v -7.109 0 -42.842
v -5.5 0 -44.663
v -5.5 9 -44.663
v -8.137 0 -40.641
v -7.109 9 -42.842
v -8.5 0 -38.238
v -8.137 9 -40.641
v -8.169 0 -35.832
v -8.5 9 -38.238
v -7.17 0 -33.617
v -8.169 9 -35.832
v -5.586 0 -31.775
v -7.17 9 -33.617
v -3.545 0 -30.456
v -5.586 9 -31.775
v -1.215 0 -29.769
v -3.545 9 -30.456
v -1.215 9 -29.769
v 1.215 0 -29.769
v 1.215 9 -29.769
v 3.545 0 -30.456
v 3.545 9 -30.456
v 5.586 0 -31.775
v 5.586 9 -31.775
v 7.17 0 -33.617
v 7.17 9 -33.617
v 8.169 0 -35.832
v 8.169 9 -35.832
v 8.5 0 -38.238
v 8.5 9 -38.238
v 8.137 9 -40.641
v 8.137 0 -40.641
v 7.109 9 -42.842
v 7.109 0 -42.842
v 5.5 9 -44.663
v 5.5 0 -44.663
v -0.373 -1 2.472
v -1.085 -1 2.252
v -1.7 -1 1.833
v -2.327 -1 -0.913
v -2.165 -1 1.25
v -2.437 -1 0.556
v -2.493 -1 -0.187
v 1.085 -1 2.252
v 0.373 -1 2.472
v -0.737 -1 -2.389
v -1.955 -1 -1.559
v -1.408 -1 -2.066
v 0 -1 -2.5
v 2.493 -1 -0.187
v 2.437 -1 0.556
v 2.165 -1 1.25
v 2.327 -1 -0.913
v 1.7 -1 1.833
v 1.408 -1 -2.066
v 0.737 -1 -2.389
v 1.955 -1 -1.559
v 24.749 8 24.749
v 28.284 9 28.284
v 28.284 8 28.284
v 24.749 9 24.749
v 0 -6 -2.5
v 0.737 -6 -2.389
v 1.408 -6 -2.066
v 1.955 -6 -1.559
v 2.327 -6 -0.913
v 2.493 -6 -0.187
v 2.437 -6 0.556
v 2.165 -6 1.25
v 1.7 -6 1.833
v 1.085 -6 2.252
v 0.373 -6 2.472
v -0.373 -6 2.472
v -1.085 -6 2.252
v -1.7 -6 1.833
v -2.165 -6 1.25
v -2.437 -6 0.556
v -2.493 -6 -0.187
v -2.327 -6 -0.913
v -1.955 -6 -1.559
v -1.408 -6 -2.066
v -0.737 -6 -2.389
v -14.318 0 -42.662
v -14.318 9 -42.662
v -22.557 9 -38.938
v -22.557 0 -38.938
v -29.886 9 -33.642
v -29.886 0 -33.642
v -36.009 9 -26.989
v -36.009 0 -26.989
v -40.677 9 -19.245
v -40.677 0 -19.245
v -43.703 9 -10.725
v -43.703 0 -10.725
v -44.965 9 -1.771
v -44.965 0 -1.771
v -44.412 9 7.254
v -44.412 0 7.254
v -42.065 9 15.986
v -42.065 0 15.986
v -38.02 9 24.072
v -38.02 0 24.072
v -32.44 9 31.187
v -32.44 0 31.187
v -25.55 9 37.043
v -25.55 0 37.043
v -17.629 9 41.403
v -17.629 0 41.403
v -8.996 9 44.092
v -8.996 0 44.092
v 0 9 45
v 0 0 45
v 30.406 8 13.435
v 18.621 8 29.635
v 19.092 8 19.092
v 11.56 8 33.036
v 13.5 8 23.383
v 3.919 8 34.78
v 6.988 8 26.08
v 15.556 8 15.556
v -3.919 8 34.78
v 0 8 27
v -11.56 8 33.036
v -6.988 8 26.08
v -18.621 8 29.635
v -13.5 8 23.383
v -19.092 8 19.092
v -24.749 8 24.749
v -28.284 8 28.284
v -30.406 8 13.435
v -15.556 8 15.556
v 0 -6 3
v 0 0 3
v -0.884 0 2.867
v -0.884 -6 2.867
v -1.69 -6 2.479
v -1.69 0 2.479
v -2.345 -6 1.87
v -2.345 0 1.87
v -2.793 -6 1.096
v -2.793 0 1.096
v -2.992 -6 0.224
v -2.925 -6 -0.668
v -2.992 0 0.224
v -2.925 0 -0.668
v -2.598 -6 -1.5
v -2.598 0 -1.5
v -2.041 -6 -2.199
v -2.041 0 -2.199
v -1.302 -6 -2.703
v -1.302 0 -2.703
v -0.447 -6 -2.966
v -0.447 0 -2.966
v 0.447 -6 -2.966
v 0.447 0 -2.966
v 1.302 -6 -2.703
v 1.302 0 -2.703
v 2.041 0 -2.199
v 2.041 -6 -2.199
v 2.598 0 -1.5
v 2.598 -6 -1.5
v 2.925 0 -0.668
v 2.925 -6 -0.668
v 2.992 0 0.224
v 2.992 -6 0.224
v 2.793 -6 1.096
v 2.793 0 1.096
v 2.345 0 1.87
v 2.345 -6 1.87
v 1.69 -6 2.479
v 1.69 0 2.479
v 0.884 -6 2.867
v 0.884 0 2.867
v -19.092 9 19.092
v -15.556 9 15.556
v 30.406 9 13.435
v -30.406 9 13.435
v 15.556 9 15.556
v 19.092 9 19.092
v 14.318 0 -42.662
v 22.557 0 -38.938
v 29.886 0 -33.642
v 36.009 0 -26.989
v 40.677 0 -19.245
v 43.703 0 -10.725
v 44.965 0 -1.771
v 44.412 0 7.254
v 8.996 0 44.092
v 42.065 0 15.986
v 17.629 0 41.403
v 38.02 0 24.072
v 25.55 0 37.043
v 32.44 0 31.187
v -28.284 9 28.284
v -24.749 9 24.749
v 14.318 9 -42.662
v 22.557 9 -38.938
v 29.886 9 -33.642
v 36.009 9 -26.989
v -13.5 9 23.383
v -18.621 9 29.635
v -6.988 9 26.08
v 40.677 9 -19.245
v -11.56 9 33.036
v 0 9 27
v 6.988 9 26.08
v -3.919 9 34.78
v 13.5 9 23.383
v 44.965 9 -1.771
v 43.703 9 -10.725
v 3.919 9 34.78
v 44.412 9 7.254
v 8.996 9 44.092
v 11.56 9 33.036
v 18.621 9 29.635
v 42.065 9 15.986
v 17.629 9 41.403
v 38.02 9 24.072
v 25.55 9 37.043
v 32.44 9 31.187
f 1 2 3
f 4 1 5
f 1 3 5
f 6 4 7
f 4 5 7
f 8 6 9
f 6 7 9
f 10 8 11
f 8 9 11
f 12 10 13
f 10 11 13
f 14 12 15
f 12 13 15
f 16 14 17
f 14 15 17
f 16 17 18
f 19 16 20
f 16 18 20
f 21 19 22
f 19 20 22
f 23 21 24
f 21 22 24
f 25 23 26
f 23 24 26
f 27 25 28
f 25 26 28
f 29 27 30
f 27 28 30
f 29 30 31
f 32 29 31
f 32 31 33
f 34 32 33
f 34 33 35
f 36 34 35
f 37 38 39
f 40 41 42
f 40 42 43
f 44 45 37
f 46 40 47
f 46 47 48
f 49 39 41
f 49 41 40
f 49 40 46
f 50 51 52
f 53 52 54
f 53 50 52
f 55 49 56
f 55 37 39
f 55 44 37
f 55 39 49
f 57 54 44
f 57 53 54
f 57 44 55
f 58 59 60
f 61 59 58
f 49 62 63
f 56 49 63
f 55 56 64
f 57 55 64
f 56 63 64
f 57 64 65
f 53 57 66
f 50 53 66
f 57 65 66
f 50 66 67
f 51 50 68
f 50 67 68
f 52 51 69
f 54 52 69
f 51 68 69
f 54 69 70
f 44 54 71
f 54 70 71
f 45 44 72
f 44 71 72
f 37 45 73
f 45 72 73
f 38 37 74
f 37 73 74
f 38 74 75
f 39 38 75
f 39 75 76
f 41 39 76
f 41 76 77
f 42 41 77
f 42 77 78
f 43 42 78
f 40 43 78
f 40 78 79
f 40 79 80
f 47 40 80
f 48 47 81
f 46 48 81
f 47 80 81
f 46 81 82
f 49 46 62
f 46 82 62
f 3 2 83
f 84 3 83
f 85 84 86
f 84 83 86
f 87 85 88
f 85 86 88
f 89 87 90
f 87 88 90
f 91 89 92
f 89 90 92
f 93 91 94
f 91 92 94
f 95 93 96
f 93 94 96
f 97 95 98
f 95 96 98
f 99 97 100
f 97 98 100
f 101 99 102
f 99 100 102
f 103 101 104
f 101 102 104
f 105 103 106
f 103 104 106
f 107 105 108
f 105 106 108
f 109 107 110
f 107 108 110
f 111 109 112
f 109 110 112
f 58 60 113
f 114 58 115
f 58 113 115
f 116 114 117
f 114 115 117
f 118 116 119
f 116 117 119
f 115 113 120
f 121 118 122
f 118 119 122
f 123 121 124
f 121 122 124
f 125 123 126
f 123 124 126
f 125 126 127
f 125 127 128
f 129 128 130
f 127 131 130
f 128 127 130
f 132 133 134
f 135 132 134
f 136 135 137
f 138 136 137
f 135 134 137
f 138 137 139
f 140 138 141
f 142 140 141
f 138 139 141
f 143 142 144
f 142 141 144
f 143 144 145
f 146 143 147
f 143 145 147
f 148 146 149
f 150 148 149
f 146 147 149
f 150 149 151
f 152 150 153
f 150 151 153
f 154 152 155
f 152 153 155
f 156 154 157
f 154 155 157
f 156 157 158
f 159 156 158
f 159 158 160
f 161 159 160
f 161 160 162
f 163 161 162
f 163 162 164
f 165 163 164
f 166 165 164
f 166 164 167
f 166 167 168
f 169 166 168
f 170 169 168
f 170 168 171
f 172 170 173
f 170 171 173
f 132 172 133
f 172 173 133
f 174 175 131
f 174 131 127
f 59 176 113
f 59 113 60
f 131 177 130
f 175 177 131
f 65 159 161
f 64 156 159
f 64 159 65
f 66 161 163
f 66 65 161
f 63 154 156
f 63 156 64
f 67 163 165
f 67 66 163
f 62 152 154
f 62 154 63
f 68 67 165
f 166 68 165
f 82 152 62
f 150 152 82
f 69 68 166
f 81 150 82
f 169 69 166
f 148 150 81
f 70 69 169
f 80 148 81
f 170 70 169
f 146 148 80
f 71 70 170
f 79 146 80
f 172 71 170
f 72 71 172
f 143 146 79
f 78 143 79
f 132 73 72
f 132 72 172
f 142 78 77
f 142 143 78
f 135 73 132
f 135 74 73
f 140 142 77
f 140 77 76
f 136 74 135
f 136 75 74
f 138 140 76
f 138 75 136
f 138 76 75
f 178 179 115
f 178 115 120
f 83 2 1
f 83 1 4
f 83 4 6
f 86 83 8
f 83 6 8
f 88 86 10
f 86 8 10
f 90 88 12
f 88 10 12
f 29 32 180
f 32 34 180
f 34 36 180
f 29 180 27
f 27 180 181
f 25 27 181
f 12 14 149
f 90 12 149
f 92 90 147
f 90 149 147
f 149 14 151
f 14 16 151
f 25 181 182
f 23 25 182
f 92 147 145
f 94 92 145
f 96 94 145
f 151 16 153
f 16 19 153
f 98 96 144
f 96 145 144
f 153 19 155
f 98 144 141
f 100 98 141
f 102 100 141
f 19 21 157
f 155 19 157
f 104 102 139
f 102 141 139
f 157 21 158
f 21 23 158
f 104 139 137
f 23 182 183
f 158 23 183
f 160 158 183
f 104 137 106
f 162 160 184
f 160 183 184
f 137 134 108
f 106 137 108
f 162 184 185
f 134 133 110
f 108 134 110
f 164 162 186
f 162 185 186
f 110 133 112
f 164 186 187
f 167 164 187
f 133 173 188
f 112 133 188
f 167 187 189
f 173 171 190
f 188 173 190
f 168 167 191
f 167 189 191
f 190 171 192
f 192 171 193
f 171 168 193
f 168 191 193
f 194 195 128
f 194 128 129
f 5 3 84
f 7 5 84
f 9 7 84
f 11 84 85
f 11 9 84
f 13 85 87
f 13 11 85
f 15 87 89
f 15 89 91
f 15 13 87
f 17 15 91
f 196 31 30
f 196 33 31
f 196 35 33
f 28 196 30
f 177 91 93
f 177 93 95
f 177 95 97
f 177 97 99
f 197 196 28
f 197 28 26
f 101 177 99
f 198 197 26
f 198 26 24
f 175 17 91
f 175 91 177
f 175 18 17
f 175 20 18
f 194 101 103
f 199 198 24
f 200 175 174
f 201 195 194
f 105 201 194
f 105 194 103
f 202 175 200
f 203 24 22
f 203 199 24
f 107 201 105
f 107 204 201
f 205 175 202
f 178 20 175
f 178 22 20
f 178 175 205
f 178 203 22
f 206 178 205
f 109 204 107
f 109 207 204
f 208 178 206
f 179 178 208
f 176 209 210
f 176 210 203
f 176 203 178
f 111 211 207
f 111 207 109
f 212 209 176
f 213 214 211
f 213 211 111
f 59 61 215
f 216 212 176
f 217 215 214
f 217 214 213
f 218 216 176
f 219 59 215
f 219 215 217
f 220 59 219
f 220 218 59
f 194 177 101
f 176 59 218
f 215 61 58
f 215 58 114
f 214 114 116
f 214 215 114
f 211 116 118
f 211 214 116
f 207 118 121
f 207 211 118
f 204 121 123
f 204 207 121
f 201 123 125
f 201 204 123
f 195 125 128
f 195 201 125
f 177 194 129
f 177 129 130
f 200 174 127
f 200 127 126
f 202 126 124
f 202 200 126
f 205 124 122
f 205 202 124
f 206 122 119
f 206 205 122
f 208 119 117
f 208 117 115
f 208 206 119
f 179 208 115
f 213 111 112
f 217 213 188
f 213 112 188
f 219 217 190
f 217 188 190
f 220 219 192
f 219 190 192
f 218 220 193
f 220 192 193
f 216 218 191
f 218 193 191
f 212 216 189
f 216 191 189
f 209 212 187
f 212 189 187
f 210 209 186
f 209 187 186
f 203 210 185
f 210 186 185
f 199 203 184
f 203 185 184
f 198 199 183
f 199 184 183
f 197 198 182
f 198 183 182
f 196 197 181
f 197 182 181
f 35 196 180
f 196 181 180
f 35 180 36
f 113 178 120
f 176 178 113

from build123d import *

# Parameters (mm, degrees)
SKETCH1_R           = 45
BOSS_EXTRUDE1_DEPTH = 9
SKETCH3_R           = 8.5
CUT_EXTRUDE2_DEPTH  = 10
SKETCH4_R           = 3
BOSS_EXTRUDE2_DEPTH = 6
SKETCH5_R           = 2.5
CUT_EXTRUDE3_DEPTH  = 5
CUT_EXTRUDE4_DEPTH  = 1


with BuildPart() as part:
    # Sketch1 → Boss-Extrude1 (new body)
    with BuildSketch(Plane(origin=(0, 0, 0), x_dir=(1, 0, 0), z_dir=(0, 1, 0))):
        with Locations(Location((0, 0, 0), (0, 0, 270))):
            Circle(SKETCH1_R)
    extrude(amount=BOSS_EXTRUDE1_DEPTH)

    # Sketch3 → Cut-Extrude2 (cut)
    with BuildSketch(Plane(origin=(0, 9, 0), x_dir=(1, 0, 0), z_dir=(0, 1, 0))):
        with Locations((0, 38.181883497)):
            Circle(SKETCH3_R)
    extrude(amount=-CUT_EXTRUDE2_DEPTH, mode=Mode.SUBTRACT)

    # Sketch4 → Boss-Extrude2 (add)
    with BuildSketch(Plane.XZ):
        with Locations(Location((0, 0, 0), (0, 0, 90))):
            Circle(SKETCH4_R)
    extrude(amount=BOSS_EXTRUDE2_DEPTH)

    # Sketch5 → Cut-Extrude3 (cut)
    with BuildSketch(Plane.XZ.offset(6)):
        with Locations(Location((0, 0, 0), (0, 0, 270))):
            Circle(SKETCH5_R)
    extrude(amount=-CUT_EXTRUDE3_DEPTH, mode=Mode.SUBTRACT)

    # Sketch6 → Cut-Extrude4 (cut)
    with BuildSketch(Plane(origin=(0, 9, 0), x_dir=(1, 0, 0), z_dir=(0, 1, 0))):
        with BuildLine():
            Line((-24.748737342, -24.748737342), (-28.284271247, -28.284271247))
            Line((-28.284271247, -28.284271247), (-30.405591591, -13.435028843))
            Line((-30.405591591, -13.435028843), (-15.556349186, -15.556349186))
            Line((-15.556349186, -15.556349186), (-19.091883092, -19.091883092))
            ThreePointArc((-19.091883092, -19.091883092), (-1.515e-06, -27), (19.09188095, -19.091885234))
            Line((19.09188095, -19.091885234), (15.556347044, -15.556351328))
            Line((15.556347044, -15.556351328), (30.405589449, -13.435030985))
            Line((30.405589449, -13.435030985), (28.284269105, -28.284273389))
            Line((28.284269105, -28.284273389), (24.7487352, -24.748739484))
            ThreePointArc((24.7487352, -24.748739484), (-1.515e-06, -35), (-24.748737342, -24.748737342))
        make_face()
    extrude(amount=-CUT_EXTRUDE4_DEPTH, mode=Mode.SUBTRACT)


solid = part.part
